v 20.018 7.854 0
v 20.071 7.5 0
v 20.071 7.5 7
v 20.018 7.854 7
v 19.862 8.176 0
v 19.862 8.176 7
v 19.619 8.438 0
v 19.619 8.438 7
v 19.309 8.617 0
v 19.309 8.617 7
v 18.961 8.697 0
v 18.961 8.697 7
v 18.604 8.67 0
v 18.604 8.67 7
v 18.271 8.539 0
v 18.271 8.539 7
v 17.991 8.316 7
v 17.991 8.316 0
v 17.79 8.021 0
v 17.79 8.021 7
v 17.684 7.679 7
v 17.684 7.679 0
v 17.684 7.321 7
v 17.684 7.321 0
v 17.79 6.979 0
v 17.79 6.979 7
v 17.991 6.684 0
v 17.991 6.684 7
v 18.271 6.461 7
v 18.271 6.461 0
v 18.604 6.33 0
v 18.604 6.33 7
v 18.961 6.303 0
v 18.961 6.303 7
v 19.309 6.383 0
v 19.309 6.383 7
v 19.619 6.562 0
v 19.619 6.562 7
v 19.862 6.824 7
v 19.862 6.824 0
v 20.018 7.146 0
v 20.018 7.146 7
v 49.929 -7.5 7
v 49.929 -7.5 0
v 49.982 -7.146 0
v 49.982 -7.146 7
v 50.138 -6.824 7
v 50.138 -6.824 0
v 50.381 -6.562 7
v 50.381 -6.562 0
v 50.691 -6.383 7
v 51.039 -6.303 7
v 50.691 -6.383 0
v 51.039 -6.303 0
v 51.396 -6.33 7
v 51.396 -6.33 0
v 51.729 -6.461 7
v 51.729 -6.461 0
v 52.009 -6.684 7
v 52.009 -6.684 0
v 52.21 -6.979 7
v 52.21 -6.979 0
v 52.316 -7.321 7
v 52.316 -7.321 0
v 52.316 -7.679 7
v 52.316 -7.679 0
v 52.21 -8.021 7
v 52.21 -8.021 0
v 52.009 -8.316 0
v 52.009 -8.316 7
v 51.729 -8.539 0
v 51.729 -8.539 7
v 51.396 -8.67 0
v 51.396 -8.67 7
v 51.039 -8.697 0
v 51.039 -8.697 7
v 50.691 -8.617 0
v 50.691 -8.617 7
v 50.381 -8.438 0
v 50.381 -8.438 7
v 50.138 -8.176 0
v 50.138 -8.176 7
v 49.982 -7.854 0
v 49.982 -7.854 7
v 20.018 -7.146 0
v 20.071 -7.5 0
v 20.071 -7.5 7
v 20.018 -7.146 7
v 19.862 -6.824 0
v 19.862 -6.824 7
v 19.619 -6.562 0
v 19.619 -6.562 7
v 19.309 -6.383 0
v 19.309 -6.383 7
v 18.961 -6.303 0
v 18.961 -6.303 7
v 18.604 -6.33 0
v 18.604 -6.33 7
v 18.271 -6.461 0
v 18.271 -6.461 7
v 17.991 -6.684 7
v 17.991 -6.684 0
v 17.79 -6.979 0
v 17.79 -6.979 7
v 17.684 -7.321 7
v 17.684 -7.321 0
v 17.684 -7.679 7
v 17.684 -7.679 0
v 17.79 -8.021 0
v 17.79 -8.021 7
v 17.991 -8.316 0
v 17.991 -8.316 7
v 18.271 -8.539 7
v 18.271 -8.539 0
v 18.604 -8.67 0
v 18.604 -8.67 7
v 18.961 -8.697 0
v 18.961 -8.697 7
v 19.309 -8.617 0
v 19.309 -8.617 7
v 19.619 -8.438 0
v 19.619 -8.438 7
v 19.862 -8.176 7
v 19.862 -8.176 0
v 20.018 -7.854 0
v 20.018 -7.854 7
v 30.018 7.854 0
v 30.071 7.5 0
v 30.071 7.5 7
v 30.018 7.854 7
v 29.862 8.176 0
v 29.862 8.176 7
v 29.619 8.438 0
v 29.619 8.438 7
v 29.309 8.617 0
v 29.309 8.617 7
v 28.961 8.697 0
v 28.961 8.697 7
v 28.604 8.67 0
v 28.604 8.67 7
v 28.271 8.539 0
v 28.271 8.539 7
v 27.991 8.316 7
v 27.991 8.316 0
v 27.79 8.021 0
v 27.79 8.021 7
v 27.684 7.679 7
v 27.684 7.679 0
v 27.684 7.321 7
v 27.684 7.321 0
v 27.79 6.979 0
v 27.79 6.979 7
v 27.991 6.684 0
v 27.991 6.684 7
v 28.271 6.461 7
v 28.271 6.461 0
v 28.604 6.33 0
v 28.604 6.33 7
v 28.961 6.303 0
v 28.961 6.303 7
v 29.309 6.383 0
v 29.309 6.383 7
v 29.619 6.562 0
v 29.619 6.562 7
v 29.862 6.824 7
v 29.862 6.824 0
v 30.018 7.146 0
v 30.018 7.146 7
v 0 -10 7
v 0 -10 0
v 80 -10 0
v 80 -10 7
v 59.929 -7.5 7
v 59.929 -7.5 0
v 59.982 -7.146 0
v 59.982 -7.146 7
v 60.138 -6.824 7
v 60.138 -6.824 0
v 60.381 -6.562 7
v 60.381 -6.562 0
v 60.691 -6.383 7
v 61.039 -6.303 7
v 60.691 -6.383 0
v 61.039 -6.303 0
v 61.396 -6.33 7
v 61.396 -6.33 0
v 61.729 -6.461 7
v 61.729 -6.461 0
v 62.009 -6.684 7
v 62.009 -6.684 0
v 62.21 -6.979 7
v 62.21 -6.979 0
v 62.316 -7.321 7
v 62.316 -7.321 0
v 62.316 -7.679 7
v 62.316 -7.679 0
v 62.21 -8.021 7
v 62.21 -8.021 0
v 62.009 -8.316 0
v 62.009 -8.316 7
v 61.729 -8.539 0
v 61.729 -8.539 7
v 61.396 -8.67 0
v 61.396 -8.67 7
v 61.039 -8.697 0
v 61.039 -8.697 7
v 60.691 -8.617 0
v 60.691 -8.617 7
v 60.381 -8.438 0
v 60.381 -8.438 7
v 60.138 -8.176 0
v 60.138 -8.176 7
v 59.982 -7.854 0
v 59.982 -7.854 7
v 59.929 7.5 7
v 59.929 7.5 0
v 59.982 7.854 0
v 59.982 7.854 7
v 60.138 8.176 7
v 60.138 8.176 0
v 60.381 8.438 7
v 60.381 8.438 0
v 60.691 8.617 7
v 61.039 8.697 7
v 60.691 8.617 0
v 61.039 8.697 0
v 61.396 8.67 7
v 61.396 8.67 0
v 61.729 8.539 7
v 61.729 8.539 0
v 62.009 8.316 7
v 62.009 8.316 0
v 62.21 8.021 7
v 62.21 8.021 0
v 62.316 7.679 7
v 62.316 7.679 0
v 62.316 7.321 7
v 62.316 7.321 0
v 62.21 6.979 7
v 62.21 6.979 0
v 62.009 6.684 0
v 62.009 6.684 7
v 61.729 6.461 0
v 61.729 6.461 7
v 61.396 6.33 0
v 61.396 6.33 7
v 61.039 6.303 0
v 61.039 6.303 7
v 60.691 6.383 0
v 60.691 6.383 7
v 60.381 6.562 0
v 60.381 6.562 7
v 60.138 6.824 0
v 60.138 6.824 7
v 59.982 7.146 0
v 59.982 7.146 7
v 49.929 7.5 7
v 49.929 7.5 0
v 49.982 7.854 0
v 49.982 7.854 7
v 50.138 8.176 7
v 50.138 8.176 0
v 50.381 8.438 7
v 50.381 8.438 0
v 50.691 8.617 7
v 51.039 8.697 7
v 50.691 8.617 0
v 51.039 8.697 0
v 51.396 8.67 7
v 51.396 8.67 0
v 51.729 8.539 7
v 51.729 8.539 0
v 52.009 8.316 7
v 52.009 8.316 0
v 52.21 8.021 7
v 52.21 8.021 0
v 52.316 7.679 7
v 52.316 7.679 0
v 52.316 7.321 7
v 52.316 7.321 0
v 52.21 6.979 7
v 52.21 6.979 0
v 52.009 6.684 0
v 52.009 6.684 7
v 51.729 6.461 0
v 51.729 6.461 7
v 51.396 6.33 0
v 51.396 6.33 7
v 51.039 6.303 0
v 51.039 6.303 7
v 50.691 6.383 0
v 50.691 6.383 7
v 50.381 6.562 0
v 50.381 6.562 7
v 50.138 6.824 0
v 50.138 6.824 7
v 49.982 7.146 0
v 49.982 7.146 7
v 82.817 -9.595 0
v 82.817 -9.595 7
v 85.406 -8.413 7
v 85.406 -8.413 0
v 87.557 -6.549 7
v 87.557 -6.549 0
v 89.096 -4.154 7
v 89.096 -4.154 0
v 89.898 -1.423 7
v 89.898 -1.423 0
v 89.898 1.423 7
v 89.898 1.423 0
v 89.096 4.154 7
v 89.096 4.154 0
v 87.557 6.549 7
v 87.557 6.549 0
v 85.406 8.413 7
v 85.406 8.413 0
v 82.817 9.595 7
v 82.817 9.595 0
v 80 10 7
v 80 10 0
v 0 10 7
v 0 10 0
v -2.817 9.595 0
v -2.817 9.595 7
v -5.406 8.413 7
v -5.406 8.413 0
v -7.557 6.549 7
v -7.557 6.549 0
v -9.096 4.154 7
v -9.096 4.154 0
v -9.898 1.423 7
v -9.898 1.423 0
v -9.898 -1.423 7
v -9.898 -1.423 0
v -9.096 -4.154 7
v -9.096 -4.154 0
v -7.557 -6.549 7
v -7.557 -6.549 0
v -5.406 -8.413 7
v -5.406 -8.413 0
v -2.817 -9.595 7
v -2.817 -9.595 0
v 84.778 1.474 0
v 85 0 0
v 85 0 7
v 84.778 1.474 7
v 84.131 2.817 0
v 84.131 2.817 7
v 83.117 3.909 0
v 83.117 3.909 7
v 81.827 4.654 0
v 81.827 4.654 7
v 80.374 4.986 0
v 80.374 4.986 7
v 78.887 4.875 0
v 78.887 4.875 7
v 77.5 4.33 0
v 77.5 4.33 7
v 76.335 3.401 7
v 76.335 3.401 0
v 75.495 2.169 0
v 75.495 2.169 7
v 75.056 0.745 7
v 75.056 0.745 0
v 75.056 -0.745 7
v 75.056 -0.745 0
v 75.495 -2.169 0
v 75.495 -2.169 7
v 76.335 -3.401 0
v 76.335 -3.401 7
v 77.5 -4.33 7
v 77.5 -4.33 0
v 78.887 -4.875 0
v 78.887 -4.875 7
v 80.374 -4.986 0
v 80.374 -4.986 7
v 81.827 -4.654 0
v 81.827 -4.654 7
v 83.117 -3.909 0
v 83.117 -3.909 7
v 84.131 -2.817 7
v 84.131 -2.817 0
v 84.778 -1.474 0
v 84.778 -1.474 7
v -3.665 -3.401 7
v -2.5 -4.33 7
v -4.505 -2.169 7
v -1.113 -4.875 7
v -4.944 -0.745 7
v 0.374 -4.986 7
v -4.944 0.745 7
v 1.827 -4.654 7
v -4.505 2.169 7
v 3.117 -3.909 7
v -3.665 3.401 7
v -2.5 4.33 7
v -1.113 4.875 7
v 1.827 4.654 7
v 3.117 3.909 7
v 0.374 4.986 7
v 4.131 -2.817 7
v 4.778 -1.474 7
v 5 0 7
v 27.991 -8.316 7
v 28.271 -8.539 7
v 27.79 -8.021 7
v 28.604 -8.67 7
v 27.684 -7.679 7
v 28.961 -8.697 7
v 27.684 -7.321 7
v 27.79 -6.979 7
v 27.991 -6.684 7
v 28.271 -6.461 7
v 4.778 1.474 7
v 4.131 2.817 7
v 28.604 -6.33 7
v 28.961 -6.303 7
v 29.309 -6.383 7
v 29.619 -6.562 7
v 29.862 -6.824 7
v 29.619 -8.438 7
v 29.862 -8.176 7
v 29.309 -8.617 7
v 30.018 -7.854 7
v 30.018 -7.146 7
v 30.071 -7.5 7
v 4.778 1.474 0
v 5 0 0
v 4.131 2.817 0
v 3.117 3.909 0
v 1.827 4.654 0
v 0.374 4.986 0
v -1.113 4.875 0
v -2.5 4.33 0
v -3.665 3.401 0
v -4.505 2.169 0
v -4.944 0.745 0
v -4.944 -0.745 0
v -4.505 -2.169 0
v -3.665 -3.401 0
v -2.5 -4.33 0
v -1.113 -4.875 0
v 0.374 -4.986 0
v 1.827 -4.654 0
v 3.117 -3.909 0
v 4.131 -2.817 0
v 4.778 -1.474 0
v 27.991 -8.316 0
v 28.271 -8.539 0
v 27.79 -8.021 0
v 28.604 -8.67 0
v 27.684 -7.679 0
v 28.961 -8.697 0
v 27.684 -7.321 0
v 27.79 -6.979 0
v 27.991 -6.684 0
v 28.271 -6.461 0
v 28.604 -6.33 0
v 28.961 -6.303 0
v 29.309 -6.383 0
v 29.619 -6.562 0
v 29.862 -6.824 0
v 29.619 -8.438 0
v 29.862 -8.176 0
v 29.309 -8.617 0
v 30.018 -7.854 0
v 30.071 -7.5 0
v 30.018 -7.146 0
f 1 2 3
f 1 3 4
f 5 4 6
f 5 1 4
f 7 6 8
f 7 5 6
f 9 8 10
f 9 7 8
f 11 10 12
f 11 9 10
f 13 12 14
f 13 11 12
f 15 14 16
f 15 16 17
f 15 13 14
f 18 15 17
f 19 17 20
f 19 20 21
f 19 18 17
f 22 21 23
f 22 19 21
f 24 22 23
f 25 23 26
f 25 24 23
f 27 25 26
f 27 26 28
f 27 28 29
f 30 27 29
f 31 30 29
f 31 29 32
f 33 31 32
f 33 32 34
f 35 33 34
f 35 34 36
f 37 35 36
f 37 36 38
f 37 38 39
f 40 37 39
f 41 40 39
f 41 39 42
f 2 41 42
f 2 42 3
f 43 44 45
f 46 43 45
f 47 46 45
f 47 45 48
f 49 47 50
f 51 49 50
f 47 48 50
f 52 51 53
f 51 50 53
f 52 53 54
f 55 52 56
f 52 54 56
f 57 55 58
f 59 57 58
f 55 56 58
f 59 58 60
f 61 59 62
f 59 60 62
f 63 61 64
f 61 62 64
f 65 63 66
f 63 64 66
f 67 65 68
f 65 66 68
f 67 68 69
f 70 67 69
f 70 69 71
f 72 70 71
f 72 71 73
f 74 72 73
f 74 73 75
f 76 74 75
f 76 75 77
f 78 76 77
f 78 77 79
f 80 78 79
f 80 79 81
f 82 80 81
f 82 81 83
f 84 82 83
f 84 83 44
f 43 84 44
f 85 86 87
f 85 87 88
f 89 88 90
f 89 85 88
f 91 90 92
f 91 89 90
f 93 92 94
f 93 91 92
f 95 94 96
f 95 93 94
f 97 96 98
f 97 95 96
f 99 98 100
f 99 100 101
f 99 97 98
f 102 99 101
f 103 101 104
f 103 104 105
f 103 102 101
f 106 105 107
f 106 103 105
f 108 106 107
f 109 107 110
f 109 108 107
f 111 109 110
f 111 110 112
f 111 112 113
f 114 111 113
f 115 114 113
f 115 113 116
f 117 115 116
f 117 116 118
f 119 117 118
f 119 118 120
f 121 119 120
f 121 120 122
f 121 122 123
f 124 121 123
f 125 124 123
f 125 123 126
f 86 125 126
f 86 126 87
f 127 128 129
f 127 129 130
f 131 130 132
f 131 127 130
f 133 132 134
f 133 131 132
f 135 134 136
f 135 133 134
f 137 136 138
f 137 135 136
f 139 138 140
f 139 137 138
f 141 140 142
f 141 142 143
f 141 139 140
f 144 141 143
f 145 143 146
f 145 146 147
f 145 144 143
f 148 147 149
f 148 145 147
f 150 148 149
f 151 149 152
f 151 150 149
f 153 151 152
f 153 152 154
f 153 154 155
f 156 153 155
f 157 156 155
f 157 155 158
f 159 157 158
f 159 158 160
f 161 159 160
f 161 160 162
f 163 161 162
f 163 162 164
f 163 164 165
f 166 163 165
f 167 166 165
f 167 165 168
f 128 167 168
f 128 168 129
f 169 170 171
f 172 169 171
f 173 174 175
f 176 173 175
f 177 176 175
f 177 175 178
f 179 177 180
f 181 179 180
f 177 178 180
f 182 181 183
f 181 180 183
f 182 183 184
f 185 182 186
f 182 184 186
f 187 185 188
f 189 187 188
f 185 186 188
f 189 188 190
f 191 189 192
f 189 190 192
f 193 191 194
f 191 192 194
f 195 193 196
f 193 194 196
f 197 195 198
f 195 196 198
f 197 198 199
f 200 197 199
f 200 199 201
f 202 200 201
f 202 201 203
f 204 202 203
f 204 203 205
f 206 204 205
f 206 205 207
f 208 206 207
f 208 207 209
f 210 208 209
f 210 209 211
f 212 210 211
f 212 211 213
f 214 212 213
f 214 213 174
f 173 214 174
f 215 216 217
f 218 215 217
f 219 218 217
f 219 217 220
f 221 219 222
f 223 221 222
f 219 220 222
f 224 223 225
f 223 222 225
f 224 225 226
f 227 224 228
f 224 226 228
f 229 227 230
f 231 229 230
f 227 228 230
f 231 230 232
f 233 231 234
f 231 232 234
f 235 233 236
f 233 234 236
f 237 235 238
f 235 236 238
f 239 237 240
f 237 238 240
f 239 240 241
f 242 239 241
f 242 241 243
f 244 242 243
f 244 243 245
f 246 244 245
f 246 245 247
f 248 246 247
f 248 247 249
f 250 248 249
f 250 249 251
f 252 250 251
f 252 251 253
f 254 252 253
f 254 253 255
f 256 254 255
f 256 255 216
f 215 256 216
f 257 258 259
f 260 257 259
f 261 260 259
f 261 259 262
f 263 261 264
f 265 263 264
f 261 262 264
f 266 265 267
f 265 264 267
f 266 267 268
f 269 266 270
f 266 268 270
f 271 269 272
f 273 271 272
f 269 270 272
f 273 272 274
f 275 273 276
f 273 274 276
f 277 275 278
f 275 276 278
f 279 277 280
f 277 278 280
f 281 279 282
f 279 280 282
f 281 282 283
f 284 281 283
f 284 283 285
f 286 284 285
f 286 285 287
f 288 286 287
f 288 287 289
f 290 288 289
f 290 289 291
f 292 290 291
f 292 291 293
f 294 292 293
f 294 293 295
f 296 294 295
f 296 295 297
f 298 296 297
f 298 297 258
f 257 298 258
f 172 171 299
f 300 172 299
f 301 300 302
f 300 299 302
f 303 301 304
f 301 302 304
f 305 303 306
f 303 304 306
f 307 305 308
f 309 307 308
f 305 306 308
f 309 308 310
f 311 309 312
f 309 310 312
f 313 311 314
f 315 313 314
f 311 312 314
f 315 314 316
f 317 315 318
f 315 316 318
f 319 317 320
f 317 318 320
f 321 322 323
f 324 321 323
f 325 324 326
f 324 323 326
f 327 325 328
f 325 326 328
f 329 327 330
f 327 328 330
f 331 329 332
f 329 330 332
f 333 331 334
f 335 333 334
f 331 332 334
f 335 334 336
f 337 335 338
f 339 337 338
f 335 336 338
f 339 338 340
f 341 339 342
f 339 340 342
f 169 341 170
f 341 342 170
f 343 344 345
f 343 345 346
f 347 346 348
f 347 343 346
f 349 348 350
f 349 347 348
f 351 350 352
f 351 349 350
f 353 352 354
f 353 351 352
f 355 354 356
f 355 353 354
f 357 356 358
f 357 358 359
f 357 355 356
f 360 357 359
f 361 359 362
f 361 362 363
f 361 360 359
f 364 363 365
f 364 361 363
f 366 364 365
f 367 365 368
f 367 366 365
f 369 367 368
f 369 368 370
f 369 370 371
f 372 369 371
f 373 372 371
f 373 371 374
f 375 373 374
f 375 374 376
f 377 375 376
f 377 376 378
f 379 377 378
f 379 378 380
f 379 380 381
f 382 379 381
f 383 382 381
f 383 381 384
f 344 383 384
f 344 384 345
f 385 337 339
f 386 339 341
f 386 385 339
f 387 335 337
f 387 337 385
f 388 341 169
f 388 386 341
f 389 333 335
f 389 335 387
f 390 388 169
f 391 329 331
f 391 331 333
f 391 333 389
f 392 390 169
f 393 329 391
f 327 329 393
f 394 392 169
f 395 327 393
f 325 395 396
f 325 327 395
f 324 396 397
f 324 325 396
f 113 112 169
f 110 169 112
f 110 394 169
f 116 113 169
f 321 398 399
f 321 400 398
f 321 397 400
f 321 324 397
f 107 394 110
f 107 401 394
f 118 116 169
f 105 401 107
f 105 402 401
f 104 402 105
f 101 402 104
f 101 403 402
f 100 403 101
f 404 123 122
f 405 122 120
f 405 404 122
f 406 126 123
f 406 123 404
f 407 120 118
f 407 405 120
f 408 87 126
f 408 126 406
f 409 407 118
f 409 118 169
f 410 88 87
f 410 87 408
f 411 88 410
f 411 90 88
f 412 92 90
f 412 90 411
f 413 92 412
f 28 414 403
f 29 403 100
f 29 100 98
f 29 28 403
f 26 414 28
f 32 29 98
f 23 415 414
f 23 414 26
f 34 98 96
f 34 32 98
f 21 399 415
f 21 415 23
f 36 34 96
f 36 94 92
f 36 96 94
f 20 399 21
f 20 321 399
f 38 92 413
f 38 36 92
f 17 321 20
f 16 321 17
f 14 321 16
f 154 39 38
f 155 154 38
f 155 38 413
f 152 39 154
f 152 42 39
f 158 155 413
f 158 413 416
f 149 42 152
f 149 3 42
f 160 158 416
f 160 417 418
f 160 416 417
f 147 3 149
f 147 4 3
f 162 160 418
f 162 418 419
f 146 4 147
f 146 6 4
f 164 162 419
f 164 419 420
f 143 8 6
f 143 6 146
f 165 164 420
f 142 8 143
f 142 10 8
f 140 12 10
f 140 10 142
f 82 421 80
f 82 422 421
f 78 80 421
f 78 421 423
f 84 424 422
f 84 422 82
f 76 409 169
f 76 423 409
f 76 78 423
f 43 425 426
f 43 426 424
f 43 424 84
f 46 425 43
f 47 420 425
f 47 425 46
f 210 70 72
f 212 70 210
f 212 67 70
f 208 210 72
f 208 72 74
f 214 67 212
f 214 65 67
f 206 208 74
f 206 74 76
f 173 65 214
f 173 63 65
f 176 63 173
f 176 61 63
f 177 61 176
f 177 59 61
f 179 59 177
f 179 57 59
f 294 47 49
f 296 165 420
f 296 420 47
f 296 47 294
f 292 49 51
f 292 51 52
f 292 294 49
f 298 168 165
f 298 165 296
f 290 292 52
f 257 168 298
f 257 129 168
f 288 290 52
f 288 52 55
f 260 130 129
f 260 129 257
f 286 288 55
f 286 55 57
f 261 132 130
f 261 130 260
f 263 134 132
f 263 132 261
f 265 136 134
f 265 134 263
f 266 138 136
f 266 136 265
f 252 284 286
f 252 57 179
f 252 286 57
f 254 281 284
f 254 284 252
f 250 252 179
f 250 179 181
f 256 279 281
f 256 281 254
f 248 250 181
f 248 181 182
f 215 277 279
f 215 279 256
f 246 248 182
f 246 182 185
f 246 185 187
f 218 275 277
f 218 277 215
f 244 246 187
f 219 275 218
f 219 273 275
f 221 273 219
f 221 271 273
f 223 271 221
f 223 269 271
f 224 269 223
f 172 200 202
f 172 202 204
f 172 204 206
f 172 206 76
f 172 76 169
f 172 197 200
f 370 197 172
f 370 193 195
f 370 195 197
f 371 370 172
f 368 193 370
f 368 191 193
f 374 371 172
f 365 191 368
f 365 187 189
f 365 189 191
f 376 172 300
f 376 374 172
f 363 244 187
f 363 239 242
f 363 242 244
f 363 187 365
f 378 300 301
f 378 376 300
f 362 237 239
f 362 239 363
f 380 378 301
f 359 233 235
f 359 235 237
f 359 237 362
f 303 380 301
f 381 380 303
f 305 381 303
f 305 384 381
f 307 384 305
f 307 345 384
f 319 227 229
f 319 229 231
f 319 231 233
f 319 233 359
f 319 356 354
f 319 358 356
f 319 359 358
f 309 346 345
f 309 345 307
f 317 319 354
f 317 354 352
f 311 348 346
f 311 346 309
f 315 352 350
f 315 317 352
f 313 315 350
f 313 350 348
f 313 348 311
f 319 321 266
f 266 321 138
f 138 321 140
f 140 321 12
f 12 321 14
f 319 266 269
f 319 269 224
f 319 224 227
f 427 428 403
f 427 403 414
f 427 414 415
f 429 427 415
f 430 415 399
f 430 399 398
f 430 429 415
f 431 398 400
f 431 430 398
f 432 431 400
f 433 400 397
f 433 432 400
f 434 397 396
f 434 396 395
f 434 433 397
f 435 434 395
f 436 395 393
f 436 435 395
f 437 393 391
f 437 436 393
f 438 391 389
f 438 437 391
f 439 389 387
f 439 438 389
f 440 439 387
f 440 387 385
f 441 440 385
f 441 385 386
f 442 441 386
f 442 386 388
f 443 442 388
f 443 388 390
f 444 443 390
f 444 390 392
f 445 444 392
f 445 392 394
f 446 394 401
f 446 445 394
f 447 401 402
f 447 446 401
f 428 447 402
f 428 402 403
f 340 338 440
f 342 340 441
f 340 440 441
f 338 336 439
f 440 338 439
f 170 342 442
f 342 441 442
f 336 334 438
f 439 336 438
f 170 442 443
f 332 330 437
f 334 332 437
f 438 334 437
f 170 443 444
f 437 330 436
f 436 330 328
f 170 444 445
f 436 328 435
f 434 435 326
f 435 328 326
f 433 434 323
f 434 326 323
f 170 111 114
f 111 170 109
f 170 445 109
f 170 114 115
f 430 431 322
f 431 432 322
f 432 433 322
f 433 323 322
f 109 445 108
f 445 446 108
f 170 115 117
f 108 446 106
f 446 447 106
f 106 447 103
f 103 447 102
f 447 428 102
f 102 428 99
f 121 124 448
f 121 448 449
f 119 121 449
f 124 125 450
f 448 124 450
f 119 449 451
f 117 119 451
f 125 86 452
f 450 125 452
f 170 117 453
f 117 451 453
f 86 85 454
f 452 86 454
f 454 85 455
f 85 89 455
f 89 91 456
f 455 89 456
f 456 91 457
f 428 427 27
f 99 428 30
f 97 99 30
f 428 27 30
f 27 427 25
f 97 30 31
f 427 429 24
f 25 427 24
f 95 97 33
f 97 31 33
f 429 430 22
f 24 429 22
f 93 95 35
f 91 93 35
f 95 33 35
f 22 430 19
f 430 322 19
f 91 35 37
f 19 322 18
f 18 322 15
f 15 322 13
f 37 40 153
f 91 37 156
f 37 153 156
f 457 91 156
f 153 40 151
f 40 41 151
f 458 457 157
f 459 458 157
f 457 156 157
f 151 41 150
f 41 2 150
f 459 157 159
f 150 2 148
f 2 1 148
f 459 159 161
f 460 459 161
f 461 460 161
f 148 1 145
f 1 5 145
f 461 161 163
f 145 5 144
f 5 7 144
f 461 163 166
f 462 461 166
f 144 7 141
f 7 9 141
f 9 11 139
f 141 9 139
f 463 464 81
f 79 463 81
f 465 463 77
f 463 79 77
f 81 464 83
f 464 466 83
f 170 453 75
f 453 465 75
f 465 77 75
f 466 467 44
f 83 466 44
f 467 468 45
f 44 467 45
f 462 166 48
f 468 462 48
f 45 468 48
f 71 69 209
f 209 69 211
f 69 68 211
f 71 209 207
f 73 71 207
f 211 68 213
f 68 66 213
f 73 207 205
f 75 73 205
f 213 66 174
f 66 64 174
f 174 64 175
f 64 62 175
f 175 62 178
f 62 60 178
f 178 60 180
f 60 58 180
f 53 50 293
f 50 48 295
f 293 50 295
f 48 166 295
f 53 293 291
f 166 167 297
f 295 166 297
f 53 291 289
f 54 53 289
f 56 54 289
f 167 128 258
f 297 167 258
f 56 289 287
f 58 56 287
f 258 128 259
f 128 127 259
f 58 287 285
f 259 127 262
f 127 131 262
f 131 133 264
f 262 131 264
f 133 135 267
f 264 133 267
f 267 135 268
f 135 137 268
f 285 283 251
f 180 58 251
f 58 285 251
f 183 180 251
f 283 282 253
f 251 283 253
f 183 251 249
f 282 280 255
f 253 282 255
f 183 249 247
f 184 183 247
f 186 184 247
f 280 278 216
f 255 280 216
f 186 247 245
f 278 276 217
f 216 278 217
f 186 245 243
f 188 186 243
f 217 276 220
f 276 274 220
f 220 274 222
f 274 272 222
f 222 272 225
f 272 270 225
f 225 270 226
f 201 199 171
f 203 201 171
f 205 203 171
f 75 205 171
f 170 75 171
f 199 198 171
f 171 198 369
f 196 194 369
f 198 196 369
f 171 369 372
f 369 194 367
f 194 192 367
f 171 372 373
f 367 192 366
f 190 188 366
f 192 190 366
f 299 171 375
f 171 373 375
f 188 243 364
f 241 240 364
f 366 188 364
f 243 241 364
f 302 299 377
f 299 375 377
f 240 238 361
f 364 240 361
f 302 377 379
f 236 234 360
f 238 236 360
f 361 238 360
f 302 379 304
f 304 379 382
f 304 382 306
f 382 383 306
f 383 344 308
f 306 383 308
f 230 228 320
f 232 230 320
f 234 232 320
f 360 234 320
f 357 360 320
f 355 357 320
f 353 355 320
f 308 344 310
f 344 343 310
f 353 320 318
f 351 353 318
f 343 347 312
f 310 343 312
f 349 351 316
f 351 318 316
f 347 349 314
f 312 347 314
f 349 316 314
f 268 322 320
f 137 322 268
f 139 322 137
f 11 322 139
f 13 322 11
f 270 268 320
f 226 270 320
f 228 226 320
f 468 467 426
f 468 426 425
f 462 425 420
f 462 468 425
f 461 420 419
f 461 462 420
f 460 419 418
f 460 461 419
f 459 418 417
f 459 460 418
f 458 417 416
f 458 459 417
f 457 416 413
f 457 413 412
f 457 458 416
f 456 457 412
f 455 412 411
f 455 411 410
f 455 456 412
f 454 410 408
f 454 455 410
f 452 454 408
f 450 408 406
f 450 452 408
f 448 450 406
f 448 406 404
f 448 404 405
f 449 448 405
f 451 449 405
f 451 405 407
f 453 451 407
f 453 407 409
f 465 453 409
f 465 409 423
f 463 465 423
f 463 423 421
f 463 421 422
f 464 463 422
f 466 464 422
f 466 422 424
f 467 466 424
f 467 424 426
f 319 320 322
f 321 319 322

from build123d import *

# Parameters (mm, degrees)
SKETCH_1_R          = 10
SKETCH_1_R_2        = 5
EXTRUDE_1_DEPTH     = 7
SKETCH_2_R          = 1.2
CUT_EXTRUDE_1_DEPTH = 10
CUT_EXTRUDE_START   = -10
SKETCH_3_R          = 5
CUT_EXTRUDE_2_DEPTH = 10
SKETCH_4_R          = 1.2
CUT_EXTRUDE_3_DEPTH = 10


with BuildPart() as part:
    # 草图1 → 凸台-拉伸1 (new body)
    # profile 1 of 2: a face of its own
    with BuildSketch(Plane.XY):
        Circle(SKETCH_1_R)
        Circle(SKETCH_1_R_2, mode=Mode.SUBTRACT)
    # profile 2 of 2: a face of its own
    with BuildSketch(Plane.XY):
        with BuildLine():
            Line((80, 10), (0, 10))
            ThreePointArc((0, 10), (7.071067812, 7.071067812), (10, 0))
            ThreePointArc((10, 0), (7.071067812, -7.071067812), (0, -10))
            Line((0, -10), (80, -10))
            ThreePointArc((80, -10), (90, 0), (80, 10))
        make_face()
    extrude(amount=EXTRUDE_1_DEPTH)

    # 草图2 → 切除-拉伸1 (cut)
    with BuildSketch(Plane(origin=(0, 0, 0), x_dir=(-1, 0, 0), z_dir=(0, 0, -1))):
        with Locations((-51.129038153, -7.5)):
            Circle(SKETCH_2_R)
        with Locations((-61.129038153, -7.5)):
            Circle(SKETCH_2_R)
        with Locations((-61.129038153, 7.5)):
            Circle(SKETCH_2_R)
        with Locations((-51.129038153, 7.5)):
            Circle(SKETCH_2_R)
    extrude(amount=-CUT_EXTRUDE_1_DEPTH, mode=Mode.SUBTRACT)

    # 草图3 → 切除-拉伸2 (cut)
    with BuildSketch(Plane.XY.offset(7).offset(CUT_EXTRUDE_START)):
        Circle(SKETCH_3_R)
        with Locations((80, 0)):
            Circle(SKETCH_3_R)
    extrude(amount=CUT_EXTRUDE_2_DEPTH, mode=Mode.SUBTRACT)

    # 草图4 → 切除-拉伸3 (cut)
    with BuildSketch(Plane.XY.offset(7).offset(CUT_EXTRUDE_START)):
        with Locations(Location((61.129038153, 7.5, 0), (0, 0, 180))):
            Circle(SKETCH_4_R)
        with Locations(Location((61.129038153, -7.5, 0), (0, 0, 180))):
            Circle(SKETCH_4_R)
        with Locations(Location((51.129038153, -7.5, 0), (0, 0, 180))):
            Circle(SKETCH_4_R)
        with Locations(Location((51.129038153, 7.5, 0), (0, 0, 180))):
            Circle(SKETCH_4_R)
        with Locations((28.870961847, 7.5)):
            Circle(SKETCH_4_R)
        with Locations((28.870961847, -7.5)):
            Circle(SKETCH_4_R)
        with Locations((18.870961847, -7.5)):
            Circle(SKETCH_4_R)
        with Locations((18.870961847, 7.5)):
            Circle(SKETCH_4_R)
    extrude(amount=CUT_EXTRUDE_3_DEPTH, mode=Mode.SUBTRACT)


solid = part.part
